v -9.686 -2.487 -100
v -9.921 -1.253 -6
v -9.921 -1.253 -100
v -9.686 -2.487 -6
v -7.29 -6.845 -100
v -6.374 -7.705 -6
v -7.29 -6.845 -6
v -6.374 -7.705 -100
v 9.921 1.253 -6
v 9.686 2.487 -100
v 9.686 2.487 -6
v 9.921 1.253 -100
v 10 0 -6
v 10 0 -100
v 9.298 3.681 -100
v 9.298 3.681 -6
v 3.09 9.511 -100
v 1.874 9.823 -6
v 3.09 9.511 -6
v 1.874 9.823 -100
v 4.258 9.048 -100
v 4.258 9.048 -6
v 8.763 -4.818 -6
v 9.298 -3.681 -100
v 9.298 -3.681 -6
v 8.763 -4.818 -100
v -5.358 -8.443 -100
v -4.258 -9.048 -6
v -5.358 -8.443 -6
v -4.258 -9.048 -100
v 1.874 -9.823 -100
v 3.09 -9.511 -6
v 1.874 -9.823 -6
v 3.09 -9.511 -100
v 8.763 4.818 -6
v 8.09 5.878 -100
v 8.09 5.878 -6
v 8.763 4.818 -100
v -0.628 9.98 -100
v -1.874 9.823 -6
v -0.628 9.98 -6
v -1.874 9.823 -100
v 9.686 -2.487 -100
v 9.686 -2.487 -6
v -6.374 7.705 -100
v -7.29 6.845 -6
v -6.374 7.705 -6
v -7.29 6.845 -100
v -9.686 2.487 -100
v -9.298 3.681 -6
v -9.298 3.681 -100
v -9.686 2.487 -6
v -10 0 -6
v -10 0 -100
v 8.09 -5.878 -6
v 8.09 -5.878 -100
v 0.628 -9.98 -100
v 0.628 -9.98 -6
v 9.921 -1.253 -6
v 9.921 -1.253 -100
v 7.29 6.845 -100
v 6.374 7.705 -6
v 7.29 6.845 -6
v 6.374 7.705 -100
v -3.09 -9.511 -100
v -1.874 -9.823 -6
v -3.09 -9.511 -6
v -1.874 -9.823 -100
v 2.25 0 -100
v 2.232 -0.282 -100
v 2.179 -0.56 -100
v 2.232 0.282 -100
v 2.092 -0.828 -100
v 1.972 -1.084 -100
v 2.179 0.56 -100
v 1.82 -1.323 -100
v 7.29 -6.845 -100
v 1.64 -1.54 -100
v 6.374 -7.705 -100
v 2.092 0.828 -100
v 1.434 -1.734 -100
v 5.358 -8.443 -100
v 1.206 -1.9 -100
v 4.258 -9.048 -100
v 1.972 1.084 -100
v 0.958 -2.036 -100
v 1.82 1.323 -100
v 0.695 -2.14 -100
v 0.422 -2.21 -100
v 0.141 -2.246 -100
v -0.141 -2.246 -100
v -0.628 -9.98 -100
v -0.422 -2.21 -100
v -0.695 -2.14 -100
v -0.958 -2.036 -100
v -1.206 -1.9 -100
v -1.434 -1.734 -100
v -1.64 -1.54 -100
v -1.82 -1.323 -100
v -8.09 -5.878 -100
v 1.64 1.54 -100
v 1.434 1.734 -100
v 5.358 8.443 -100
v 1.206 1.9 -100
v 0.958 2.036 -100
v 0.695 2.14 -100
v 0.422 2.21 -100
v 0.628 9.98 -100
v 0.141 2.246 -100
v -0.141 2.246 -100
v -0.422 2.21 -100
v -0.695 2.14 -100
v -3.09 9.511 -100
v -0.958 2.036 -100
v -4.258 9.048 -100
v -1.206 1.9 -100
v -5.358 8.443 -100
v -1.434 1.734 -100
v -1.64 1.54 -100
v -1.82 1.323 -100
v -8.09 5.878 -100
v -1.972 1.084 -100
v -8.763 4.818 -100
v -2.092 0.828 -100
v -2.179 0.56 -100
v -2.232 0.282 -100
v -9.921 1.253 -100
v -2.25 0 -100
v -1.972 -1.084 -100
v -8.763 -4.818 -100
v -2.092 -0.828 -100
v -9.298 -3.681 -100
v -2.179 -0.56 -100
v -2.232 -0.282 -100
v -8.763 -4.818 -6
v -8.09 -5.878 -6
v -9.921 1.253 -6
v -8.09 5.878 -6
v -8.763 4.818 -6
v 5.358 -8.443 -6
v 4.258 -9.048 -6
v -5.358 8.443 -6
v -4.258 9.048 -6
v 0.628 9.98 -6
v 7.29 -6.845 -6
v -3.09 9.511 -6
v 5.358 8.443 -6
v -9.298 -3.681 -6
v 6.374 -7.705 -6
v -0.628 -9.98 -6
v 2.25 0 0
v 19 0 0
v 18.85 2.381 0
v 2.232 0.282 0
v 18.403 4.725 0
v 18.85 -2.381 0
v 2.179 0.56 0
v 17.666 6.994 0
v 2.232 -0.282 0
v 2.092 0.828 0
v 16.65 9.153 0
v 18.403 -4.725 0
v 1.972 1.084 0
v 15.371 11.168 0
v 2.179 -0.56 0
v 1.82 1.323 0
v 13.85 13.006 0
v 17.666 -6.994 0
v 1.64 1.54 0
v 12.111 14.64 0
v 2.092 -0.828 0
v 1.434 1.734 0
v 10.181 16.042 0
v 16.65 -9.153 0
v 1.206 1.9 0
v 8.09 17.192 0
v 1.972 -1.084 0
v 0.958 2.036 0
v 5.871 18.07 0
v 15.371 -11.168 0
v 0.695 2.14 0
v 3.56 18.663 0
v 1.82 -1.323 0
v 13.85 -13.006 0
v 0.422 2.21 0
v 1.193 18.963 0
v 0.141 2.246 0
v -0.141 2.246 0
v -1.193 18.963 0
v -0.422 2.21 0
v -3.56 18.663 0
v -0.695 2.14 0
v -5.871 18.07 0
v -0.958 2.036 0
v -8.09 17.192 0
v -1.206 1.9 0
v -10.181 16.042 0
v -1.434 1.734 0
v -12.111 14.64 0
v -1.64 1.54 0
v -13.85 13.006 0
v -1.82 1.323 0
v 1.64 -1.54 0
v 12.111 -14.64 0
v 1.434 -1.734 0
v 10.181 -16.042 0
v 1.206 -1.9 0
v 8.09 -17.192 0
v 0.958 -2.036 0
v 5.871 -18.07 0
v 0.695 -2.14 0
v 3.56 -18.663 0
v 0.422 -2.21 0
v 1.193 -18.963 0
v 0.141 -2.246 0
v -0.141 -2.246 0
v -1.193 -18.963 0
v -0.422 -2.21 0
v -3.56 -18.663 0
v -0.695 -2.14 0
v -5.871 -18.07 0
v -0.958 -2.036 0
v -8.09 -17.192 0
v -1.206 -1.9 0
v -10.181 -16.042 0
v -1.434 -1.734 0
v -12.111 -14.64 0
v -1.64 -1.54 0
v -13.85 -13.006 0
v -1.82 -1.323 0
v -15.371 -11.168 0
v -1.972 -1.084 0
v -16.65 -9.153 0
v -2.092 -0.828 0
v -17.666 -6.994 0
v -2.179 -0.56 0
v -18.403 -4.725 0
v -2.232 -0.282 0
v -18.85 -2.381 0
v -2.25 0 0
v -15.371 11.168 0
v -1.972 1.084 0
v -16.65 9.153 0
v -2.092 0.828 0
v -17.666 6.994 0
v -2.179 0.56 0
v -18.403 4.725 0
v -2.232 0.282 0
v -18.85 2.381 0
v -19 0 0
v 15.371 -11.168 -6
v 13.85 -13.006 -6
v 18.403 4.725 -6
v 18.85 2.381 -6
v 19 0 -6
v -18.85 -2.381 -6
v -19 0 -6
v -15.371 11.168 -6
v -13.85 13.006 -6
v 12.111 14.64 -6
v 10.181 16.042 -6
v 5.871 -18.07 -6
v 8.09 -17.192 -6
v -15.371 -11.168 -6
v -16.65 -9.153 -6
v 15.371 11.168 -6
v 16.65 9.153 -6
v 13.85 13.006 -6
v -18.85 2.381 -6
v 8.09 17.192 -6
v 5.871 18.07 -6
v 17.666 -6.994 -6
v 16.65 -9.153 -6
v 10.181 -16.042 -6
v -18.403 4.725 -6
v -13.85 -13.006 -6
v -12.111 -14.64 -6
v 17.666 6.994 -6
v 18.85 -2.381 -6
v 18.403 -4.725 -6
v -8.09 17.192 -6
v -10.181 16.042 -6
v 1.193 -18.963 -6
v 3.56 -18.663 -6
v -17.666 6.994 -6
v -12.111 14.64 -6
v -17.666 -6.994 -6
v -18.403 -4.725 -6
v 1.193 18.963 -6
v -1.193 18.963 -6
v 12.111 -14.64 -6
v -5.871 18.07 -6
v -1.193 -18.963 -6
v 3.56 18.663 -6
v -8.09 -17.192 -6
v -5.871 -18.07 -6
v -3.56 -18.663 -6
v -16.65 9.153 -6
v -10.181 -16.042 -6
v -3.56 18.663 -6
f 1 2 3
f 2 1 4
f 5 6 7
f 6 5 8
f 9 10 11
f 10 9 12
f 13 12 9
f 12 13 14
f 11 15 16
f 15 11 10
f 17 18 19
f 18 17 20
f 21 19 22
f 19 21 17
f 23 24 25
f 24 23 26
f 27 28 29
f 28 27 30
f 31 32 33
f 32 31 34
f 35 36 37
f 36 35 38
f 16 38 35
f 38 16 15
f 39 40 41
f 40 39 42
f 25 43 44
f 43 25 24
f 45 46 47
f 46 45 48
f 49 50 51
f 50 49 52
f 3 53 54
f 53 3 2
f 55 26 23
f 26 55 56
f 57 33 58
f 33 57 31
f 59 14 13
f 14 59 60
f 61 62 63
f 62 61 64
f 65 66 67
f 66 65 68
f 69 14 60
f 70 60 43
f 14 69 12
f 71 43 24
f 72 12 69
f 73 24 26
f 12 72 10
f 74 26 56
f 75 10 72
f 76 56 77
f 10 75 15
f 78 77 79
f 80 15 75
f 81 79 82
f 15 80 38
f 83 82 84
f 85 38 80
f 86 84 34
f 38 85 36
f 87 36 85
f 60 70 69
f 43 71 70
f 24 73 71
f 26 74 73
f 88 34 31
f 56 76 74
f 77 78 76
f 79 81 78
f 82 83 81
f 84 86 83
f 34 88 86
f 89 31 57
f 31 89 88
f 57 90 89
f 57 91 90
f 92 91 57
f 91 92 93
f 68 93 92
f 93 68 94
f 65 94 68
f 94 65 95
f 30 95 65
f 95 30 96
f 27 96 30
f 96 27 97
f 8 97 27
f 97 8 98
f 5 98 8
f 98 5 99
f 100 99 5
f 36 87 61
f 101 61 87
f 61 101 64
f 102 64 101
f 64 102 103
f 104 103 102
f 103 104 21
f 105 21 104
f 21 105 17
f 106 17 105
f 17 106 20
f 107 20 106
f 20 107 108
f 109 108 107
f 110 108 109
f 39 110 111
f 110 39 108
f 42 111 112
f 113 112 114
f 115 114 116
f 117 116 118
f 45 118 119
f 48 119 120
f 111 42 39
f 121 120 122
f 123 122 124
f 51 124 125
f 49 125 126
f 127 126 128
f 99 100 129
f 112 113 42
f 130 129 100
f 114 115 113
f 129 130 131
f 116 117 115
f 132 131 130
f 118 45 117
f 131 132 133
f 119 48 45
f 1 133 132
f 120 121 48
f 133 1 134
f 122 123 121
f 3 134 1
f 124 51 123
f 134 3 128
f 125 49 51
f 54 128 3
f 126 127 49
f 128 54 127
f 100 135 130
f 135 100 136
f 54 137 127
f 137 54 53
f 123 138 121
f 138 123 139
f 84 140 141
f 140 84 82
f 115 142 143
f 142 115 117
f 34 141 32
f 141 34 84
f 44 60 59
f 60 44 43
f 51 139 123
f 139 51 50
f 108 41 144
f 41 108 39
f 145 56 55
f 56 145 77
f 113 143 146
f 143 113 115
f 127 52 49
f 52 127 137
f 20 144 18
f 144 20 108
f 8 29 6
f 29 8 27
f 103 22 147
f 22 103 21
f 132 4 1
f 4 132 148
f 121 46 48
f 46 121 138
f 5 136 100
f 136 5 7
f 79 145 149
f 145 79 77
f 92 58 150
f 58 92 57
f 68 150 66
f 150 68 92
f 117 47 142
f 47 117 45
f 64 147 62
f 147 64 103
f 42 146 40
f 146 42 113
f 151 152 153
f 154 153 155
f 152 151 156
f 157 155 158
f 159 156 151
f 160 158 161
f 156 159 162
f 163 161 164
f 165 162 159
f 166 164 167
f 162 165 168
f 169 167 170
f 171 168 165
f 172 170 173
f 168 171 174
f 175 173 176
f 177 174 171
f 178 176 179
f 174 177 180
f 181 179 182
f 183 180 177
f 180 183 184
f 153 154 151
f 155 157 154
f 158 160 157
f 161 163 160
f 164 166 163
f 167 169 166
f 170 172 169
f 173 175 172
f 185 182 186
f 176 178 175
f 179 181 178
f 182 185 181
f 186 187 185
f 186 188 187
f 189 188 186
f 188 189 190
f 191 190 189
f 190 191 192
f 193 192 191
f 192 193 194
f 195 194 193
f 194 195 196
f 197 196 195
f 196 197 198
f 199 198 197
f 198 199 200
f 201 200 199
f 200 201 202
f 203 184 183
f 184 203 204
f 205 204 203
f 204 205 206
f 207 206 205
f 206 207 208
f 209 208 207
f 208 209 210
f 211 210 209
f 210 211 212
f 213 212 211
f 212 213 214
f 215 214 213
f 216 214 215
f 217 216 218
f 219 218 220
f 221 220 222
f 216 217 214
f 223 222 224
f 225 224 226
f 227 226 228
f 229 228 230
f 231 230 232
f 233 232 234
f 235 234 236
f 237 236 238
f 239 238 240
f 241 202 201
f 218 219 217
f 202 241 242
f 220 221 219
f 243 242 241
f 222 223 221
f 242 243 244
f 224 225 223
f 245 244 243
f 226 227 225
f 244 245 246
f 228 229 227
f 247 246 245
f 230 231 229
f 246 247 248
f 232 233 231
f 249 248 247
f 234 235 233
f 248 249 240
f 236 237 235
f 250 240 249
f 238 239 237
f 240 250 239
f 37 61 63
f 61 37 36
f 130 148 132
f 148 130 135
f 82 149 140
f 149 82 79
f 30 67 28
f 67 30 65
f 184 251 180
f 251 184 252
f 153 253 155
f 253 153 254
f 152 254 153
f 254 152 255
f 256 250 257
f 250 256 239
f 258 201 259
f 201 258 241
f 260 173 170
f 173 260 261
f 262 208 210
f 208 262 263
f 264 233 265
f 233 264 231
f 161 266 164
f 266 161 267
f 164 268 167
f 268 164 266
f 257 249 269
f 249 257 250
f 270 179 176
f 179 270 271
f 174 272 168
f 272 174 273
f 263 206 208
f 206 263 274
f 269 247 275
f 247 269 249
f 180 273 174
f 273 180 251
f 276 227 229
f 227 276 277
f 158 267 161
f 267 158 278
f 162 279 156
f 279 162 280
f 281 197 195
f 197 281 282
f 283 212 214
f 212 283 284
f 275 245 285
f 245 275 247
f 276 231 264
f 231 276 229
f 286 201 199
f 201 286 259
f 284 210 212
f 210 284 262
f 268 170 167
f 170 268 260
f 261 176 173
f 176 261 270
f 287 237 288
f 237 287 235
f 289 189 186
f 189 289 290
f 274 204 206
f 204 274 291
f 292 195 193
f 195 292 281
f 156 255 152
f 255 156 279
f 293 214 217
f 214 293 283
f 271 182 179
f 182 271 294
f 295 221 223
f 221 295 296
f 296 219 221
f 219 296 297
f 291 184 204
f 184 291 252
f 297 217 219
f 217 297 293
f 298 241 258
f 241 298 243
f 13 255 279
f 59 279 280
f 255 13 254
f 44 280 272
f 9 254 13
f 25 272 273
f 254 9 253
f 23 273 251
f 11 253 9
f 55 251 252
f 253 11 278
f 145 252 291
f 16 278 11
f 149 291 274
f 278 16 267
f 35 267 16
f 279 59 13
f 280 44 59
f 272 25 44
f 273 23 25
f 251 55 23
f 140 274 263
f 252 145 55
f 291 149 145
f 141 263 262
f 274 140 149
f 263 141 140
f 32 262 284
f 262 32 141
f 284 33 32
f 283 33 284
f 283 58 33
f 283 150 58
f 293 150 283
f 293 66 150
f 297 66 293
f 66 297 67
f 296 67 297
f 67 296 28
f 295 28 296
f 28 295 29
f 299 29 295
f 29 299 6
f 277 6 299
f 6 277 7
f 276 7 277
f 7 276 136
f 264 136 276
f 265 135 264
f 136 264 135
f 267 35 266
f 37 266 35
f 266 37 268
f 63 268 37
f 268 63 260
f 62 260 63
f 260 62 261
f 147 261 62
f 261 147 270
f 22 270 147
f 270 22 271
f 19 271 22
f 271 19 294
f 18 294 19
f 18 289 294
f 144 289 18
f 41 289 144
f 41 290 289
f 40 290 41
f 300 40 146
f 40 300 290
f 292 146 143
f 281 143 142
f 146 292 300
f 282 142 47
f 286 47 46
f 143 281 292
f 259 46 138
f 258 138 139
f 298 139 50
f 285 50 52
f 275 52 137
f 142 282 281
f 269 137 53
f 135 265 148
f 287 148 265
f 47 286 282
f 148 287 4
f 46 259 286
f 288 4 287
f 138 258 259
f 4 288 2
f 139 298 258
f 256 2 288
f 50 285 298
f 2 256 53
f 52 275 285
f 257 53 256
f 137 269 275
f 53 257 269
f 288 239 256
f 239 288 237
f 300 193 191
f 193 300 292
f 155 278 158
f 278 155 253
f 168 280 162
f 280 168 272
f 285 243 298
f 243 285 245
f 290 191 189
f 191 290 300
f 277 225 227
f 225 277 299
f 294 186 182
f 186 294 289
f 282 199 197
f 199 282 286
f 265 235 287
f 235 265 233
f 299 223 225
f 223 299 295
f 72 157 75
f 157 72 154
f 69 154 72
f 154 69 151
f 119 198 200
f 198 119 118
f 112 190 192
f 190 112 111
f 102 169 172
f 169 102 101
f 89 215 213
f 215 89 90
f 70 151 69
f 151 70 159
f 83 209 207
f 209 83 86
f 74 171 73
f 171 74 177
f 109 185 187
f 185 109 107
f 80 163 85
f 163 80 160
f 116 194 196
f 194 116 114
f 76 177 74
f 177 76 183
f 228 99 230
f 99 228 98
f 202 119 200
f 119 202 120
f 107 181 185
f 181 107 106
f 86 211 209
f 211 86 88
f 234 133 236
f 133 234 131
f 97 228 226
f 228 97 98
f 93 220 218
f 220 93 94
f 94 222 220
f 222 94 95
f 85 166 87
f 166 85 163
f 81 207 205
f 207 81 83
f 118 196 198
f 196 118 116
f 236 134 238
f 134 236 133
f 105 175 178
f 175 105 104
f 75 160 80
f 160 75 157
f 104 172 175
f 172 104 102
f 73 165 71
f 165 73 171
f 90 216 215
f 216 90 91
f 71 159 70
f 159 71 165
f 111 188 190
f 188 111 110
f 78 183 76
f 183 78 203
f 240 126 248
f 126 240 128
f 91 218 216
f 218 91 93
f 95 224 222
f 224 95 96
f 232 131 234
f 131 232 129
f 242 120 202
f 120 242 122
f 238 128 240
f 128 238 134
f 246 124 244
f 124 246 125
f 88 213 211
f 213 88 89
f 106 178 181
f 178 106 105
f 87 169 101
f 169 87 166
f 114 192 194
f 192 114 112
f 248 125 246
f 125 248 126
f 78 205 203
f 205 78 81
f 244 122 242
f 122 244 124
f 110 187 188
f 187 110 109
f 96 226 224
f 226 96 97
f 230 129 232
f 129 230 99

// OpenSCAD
$fn = 50;


difference() {
	union() {
		translate(v = [0, 0, -100.0000000000]) {
			cylinder(h = 100, r = 10.0000000000);
		}
		translate(v = [0, 0, -6.0000000000]) {
			cylinder(h = 6, r = 19.0000000000);
		}
	}
	union() {
		#translate(v = [0, 0, -100]) {
			cylinder(h = 100, r = 2.2500000000);
		}
	}
}
